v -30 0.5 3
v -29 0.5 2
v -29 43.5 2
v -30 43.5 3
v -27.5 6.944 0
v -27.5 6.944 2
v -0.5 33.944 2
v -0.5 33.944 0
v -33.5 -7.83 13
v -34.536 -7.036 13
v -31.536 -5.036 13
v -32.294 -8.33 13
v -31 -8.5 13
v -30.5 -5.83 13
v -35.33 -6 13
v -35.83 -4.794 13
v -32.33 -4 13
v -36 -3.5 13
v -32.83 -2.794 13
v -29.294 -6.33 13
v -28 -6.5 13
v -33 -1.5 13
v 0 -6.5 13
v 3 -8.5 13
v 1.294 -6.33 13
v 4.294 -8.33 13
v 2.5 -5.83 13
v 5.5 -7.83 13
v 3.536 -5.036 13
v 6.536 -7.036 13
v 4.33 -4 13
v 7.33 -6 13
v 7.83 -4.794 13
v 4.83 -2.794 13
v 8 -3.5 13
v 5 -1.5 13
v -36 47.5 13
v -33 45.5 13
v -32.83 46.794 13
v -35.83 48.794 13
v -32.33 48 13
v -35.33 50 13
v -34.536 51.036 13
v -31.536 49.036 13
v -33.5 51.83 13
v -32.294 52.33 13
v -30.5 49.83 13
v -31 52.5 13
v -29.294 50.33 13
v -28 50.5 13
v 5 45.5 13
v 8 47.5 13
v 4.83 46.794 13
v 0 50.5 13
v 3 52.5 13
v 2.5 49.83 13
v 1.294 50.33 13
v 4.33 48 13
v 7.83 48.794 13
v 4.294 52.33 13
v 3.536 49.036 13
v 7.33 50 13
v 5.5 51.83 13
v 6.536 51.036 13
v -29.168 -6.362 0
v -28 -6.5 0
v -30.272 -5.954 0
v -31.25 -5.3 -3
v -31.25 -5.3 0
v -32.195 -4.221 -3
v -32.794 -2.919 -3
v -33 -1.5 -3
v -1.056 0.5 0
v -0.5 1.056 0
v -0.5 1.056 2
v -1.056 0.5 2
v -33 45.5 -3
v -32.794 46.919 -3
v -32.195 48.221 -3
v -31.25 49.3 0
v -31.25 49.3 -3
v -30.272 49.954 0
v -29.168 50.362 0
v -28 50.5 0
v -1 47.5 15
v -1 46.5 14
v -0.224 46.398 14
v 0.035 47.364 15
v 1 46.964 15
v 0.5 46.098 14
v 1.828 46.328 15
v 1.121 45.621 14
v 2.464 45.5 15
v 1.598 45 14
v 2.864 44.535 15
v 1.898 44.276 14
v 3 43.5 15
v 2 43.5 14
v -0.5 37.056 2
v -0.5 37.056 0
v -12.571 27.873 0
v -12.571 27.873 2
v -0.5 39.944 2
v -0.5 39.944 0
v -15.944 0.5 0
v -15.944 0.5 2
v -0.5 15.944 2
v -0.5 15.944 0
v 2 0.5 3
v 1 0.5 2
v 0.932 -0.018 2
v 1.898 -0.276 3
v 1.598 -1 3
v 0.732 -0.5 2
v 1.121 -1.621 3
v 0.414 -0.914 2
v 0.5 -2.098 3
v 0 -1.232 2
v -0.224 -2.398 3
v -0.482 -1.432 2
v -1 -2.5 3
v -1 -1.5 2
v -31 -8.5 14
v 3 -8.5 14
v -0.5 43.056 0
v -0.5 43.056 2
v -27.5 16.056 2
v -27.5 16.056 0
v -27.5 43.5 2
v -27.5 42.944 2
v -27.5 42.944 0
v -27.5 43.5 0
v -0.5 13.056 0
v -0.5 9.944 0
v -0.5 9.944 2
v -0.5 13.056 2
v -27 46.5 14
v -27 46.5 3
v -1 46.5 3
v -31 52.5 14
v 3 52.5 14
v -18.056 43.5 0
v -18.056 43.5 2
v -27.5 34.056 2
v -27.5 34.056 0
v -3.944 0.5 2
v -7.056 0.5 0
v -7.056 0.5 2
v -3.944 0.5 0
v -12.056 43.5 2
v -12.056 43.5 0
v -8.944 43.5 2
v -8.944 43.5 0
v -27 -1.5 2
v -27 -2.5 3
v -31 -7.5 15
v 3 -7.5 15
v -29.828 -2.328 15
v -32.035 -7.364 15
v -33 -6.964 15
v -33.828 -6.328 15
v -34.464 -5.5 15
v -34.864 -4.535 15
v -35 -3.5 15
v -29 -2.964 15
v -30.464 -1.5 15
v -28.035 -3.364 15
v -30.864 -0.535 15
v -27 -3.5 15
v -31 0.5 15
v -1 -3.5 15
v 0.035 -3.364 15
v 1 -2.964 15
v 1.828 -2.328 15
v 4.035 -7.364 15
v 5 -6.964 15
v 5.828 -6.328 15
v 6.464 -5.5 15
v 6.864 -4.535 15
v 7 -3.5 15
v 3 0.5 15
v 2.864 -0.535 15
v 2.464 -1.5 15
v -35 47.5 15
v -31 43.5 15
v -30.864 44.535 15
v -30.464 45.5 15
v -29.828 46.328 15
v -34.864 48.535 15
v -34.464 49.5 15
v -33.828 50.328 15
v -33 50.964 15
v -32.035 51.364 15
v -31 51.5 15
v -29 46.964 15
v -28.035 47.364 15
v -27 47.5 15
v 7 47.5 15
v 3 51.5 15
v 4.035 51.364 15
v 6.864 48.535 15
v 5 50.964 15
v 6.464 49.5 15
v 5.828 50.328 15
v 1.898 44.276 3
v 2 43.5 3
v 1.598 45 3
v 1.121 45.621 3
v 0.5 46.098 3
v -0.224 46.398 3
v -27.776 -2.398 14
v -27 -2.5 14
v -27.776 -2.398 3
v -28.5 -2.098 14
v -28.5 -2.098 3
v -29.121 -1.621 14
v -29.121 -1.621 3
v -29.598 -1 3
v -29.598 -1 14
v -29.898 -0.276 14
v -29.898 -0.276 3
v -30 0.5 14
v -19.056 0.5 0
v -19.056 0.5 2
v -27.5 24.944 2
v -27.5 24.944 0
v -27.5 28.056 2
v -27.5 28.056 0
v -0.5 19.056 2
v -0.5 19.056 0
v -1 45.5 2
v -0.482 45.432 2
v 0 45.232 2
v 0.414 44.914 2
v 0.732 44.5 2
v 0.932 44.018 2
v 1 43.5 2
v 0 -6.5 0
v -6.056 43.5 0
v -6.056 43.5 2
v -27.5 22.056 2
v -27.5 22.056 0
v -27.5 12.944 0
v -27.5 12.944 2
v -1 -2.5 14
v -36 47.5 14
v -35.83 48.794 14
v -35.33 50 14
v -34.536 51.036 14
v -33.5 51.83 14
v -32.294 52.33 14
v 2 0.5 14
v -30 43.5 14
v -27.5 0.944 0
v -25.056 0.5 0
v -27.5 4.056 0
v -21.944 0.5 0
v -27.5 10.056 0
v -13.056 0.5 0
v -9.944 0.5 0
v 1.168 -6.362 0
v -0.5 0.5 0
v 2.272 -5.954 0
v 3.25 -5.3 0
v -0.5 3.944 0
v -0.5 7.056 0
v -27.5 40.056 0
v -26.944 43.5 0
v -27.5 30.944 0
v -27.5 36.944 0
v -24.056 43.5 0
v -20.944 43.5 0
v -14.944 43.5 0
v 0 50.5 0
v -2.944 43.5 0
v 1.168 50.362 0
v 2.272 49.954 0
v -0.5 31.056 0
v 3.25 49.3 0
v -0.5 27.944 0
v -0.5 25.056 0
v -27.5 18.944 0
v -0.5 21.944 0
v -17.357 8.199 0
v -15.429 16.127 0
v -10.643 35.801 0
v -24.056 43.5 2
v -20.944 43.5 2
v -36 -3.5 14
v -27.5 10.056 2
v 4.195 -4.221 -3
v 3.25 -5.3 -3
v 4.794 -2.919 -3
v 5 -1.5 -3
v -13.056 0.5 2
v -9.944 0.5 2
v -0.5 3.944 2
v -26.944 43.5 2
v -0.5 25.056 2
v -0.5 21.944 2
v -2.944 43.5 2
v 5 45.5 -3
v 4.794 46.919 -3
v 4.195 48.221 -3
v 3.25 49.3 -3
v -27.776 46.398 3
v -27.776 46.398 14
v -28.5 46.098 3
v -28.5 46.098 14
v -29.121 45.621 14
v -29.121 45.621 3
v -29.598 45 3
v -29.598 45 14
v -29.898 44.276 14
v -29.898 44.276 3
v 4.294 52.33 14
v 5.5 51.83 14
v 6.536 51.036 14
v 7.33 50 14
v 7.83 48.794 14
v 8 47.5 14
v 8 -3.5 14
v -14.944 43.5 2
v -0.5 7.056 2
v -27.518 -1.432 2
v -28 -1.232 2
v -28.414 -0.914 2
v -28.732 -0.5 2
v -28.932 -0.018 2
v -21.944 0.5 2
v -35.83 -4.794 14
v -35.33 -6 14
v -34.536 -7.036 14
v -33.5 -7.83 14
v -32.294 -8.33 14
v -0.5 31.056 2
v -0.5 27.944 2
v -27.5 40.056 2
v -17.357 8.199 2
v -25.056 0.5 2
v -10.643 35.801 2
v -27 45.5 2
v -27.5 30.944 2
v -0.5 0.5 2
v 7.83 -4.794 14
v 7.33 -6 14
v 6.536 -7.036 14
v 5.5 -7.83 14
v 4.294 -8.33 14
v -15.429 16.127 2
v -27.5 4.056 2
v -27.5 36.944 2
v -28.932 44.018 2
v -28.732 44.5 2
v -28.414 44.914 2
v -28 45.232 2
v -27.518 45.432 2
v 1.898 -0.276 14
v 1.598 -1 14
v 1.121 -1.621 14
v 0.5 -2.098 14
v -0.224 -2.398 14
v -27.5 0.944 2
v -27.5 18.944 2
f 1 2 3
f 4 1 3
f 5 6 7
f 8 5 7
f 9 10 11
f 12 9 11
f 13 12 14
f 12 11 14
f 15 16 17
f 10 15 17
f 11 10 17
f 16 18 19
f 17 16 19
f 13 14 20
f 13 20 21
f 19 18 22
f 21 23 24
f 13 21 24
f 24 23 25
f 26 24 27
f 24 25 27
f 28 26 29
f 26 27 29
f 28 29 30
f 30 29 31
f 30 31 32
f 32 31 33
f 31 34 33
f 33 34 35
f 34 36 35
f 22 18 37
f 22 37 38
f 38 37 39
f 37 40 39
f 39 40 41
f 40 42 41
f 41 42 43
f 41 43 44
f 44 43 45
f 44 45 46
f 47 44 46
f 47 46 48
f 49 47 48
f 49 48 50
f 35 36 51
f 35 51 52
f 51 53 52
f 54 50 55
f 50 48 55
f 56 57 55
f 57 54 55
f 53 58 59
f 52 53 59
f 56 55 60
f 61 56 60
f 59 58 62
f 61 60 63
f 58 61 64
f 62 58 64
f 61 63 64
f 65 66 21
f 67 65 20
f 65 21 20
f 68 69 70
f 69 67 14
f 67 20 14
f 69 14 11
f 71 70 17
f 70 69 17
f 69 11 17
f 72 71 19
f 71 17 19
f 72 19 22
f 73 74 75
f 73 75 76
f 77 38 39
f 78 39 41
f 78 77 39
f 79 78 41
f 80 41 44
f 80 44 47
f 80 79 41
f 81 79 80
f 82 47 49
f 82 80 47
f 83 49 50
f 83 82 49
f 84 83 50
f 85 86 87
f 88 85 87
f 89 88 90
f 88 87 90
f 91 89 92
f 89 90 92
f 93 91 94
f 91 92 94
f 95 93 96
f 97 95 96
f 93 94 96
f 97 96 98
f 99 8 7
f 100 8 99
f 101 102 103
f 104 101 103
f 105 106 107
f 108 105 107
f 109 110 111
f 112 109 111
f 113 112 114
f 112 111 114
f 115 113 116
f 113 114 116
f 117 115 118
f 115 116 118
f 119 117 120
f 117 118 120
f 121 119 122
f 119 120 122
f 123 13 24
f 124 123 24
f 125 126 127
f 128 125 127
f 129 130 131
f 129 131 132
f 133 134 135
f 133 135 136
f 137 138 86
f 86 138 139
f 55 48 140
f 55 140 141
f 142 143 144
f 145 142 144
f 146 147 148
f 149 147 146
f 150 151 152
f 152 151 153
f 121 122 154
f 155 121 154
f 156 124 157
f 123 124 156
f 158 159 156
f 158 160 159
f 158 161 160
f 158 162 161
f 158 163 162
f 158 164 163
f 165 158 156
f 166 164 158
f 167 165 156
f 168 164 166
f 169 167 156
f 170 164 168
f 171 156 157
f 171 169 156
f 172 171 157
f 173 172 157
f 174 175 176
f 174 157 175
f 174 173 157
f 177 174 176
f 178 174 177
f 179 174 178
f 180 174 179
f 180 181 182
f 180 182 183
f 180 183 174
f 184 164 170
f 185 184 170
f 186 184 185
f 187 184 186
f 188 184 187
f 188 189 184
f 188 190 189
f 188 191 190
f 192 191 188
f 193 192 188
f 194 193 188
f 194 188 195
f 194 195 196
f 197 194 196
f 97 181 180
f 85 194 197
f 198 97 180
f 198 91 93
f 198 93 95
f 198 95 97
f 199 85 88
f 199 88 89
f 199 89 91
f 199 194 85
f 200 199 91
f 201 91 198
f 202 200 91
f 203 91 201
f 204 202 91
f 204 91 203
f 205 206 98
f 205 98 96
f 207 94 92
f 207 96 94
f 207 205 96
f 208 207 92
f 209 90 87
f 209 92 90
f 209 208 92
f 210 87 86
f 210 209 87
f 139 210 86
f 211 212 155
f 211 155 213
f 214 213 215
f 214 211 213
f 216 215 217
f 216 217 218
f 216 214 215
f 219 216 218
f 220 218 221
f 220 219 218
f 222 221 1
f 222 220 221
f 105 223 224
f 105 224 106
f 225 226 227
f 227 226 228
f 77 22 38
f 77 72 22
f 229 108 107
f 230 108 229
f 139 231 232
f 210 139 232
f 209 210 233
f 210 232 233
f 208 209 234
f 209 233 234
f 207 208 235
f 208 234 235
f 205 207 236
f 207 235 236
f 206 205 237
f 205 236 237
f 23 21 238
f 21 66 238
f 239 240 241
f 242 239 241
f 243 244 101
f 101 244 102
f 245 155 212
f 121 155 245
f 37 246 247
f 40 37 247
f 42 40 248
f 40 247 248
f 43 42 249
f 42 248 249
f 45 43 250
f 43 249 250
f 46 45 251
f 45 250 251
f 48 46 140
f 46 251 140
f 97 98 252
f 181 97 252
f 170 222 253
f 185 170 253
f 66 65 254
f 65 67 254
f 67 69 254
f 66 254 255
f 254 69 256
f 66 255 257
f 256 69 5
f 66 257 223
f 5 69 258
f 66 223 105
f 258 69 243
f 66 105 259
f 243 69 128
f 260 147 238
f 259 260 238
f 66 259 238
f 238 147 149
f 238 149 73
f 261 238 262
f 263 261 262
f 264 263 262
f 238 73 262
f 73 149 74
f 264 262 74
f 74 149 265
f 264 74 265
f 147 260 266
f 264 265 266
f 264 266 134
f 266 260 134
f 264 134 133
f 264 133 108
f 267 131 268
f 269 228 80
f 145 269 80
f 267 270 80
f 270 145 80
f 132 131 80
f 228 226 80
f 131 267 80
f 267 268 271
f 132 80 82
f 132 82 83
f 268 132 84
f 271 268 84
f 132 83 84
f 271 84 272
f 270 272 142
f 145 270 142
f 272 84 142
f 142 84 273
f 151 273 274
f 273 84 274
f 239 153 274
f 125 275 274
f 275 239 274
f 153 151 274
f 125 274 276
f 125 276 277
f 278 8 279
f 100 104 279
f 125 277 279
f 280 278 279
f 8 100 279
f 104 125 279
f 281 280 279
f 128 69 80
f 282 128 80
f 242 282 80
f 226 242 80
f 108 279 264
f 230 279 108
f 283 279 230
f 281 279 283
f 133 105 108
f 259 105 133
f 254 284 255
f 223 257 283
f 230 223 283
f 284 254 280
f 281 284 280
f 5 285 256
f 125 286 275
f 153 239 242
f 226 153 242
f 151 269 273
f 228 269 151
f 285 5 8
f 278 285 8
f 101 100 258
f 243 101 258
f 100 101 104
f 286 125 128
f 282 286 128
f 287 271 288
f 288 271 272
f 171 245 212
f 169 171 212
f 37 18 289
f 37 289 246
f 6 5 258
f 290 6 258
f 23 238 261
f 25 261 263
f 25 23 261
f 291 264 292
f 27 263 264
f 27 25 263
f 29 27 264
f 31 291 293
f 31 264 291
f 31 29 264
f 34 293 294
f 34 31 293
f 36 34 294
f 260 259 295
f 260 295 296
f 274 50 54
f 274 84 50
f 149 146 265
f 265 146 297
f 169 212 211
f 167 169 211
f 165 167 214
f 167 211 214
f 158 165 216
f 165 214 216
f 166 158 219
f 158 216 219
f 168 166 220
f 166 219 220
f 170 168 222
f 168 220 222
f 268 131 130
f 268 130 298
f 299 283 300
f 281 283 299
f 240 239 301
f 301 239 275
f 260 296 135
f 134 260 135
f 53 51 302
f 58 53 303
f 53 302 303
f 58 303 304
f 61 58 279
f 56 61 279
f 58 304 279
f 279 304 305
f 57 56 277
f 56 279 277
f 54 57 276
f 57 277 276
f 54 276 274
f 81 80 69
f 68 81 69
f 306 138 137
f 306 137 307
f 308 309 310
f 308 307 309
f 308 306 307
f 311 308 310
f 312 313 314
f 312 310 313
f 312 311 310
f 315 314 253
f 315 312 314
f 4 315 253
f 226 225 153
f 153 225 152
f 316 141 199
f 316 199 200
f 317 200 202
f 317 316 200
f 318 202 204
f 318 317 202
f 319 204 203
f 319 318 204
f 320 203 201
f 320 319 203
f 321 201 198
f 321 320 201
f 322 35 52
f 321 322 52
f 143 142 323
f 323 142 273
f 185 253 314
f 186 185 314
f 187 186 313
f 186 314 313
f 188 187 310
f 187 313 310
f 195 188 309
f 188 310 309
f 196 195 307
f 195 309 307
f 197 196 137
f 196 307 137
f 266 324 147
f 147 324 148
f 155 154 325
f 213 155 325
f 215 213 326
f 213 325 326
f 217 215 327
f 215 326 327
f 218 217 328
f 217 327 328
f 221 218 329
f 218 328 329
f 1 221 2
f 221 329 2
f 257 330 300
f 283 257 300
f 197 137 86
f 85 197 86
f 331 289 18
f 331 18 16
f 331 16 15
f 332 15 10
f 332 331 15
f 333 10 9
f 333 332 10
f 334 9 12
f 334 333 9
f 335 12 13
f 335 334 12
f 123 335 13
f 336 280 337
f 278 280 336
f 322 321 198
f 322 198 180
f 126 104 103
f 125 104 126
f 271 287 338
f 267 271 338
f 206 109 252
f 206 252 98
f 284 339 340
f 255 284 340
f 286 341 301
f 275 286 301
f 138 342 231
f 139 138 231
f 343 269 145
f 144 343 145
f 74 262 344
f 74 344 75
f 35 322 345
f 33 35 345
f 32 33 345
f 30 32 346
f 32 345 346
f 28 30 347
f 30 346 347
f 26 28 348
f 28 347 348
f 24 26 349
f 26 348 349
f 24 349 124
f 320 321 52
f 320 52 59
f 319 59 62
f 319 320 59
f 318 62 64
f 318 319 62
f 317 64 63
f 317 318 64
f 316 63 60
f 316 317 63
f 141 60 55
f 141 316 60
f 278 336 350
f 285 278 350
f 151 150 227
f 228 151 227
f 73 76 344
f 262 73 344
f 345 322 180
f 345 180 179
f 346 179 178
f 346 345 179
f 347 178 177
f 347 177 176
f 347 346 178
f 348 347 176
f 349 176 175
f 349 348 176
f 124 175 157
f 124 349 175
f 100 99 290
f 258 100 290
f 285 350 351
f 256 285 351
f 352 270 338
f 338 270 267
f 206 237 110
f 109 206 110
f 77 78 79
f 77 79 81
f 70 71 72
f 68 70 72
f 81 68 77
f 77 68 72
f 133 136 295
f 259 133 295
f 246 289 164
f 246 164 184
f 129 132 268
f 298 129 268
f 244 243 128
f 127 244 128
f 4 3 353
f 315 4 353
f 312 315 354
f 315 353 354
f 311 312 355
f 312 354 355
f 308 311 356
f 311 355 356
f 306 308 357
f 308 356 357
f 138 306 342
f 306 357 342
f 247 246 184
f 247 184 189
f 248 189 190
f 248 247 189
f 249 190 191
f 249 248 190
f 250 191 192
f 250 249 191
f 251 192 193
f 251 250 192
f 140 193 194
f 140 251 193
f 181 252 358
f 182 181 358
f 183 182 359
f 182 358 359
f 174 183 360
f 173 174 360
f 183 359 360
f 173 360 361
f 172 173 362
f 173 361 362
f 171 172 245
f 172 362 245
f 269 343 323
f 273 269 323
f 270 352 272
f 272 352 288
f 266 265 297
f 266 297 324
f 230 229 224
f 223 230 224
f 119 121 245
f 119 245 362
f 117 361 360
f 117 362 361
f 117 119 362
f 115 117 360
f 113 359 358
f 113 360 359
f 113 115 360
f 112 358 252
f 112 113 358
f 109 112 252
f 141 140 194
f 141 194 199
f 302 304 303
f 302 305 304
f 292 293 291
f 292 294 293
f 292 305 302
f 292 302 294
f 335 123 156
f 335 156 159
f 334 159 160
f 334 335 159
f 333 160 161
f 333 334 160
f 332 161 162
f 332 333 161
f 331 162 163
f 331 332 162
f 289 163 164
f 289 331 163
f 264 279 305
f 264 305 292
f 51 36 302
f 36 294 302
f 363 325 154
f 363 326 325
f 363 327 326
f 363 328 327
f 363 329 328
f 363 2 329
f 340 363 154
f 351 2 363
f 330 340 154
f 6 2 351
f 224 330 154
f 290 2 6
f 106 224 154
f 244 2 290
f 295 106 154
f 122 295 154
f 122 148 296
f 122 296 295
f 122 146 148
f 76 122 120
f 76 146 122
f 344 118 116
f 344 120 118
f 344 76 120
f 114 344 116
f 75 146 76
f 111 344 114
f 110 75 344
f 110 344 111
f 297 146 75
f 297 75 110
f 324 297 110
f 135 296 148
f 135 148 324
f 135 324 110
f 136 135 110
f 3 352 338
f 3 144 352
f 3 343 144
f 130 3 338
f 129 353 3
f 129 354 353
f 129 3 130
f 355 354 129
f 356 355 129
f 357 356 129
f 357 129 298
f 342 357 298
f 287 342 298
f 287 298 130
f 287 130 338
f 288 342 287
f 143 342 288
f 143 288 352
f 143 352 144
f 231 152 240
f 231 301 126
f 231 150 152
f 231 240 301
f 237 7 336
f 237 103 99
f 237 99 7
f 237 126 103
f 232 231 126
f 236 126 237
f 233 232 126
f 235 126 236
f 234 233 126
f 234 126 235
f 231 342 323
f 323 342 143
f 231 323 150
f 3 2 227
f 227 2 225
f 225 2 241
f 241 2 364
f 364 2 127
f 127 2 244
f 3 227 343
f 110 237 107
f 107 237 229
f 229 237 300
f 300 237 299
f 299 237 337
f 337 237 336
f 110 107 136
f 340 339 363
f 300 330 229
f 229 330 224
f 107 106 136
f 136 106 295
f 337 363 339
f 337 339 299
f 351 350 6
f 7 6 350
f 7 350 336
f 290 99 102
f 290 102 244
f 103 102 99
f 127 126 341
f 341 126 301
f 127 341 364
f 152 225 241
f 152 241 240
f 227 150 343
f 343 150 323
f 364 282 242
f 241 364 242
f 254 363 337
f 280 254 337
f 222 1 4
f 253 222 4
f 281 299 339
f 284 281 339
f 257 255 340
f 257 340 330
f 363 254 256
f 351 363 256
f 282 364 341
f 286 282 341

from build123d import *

# Parameters (mm, degrees)
F0_W      = 28
F0_H      = 44
F1_DEPTH  = 2
F3_DEPTH  = 2
F4_W      = 38
F4_H      = 57
F4_W_2    = 27
F4_H_2    = 43
F5_DEPTH  = 2
F6_W      = 1.75
F6_H      = 57
F7_DEPTH  = 3
F8_W      = 38
F8_H      = 57
F8_W_2    = 32
F8_H_2    = 49
F9_DEPTH  = 11
F10_W     = 44
F10_H     = 61
F10_W_2   = 32
F10_H_2   = 49
F11_DEPTH = 2
F12_R     = 5
F13_R     = 3
F14_SIZE  = 1


with BuildPart() as f1:
    # F0 (on Top) → F1 (new body)
    with BuildSketch(Plane.XY):
        with Locations((-14, 22)):
            Rectangle(F0_W, F0_H)
    extrude(amount=F1_DEPTH)

    # F2 (on face) → F3 (cut, through all)
    with BuildSketch(Plane.XY.offset(2)):
        Polygon((-28, 48.4443650814), (-1.0000491969, 75.4443158845), (0, 79.5556349186), (-29.5556349186, 50), align=None)
        Polygon((0, 79.5556349186), (-1.0000491969, 75.4443158845), (1.5556349186, 78), align=None)
        Polygon((-28, 42.4443650814), (-2.9286171114, 67.51574797), (-1.9285679145, 71.6270670041), (-29.5556349186, 44), align=None)
        Polygon((-1.9285679145, 71.6270670041), (-2.9286171114, 67.51574797), (1.5556349186, 72), (0, 73.5556349186), align=None)
        Polygon((-28, 36.4443650814), (-4.8571850259, 59.5871800555), (-3.857135829, 63.6984990896), (-29.5556349186, 38), align=None)
        Polygon((-3.857135829, 63.6984990896), (-4.8571850259, 59.5871800555), (1.5556349186, 66), (0, 67.5556349186), align=None)
        Polygon((-28, 30.4443650814), (-6.7857529404, 51.658612141), (-5.7857037435, 55.7699311751), (-29.5556349186, 32), align=None)
        Polygon((-5.7857037435, 55.7699311751), (-6.7857529404, 51.658612141), (1.5556349186, 60), (0, 61.5556349186), align=None)
        Polygon((-28, 24.4443650814), (-8.7143208549, 43.7300442265), (-7.714271658, 47.8413632606), (-29.5556349186, 26), align=None)
        Polygon((-7.714271658, 47.8413632606), (-8.7143208549, 43.7300442265), (1.5556349186, 54), (0, 55.5556349186), align=None)
        Polygon((-28, 18.4443650814), (-10.6428887694, 35.8014763119), (-9.6428395725, 39.9127953461), (-29.5556349186, 20), align=None)
        Polygon((-9.6428395725, 39.9127953461), (-10.6428887694, 35.8014763119), (1.5556349186, 48), (0, 49.5556349186), align=None)
        Polygon((-28, 12.4443650814), (-12.5714566839, 27.8729083974), (-11.571407487, 31.9842274316), (-29.5556349186, 14), align=None)
        Polygon((-11.571407487, 31.9842274316), (-12.5714566839, 27.8729083974), (1.5556349186, 42), (0, 43.5556349186), align=None)
        Polygon((-28, 6.4443650814), (-14.5000245985, 19.9443404829), (-13.4999754015, 24.0556595171), (-29.5556349186, 8), align=None)
        Polygon((-13.4999754015, 24.0556595171), (-14.5000245985, 19.9443404829), (1.5556349186, 36), (0, 37.5556349186), align=None)
        Polygon((-28, 0.4443650814), (-16.428592513, 12.0157725684), (-15.4285433161, 16.1270916026), (-29.5556349186, 2), align=None)
        Polygon((-15.4285433161, 16.1270916026), (-16.428592513, 12.0157725684), (1.5556349186, 30), (0, 31.5556349186), align=None)
        Polygon((-28, -5.5556349186), (-18.3571604275, 4.0872046539), (-17.3571112306, 8.1985236881), (-29.5556349186, -4), align=None)
        Polygon((-17.3571112306, 8.1985236881), (-18.3571604275, 4.0872046539), (1.5556349186, 24), (0, 25.5556349186), align=None)
        Polygon((-28, -11.5556349186), (-20.285728342, -3.8413632606), (-19.2856791451, 0.2699557735), (-29.5556349186, -10), align=None)
        Polygon((-19.2856791451, 0.2699557735), (-20.285728342, -3.8413632606), (1.5556349186, 18), (0, 19.5556349186), align=None)
        Polygon((-28, -17.5556349186), (-22.2142962565, -11.7699311751), (-21.2142470596, -7.658612141), (-29.5556349186, -16), align=None)
        Polygon((-21.2142470596, -7.658612141), (-22.2142962565, -11.7699311751), (1.5556349186, 12), (0, 13.5556349186), align=None)
        Polygon((-28, -23.5556349186), (-24.142864171, -19.6984990896), (-23.1428149741, -15.5871800555), (-29.5556349186, -22), align=None)
        Polygon((-23.1428149741, -15.5871800555), (-24.142864171, -19.6984990896), (1.5556349186, 6), (0, 7.5556349186), align=None)
        Polygon((-28, -29.5556349186), (-26.0714320855, -27.6270670041), (-25.0713828886, -23.51574797), (-29.5556349186, -28), align=None)
        Polygon((-25.0713828886, -23.51574797), (-26.0714320855, -27.6270670041), (1.5556349186, 0), (0, 1.5556349186), align=None)
        Polygon((-26.9999508031, -31.4443158845), (-29.5556349186, -34), (-28, -35.5556349186), align=None)
        Polygon((0, -4.4443650814), (-26.9999508031, -31.4443158845), (-28, -35.5556349186), (1.5556349186, -6), align=None)
    extrude(amount=-F3_DEPTH, mode=Mode.SUBTRACT)

    # F4 (on Top) → F5 (join)
    with BuildSketch(Plane.XY):
        with Locations((-14, 22)):
            Rectangle(F4_W, F4_H)
        with Locations((-14, 22)):
            Rectangle(F4_W_2, F4_H_2, mode=Mode.SUBTRACT)
    extrude(amount=F5_DEPTH)

    # F6 (on face) → F7 (join)
    with BuildSketch(Plane(origin=(0, 0, 0), x_dir=(1, 0, 0), z_dir=(0, 0, -1))):
        with Locations((-32.125, -22)):
            Rectangle(F6_W, F6_H)
        with Locations((4.125, -22)):
            Rectangle(F6_W, F6_H)
    extrude(amount=F7_DEPTH)

    # F8 (on face) → F9 (join)
    with BuildSketch(Plane.XY.offset(2)):
        with Locations((-14, 22)):
            Rectangle(F8_W, F8_H)
        with Locations((-14, 22)):
            Rectangle(F8_W_2, F8_H_2, mode=Mode.SUBTRACT)
    extrude(amount=F9_DEPTH)

    # F10 (on face) → F11 (join)
    with BuildSketch(Plane.XY.offset(13)):
        with Locations((-14, 22)):
            Rectangle(F10_W, F10_H)
        with Locations((-14, 22)):
            Rectangle(F10_W_2, F10_H_2, mode=Mode.SUBTRACT)
    extrude(amount=F11_DEPTH)

    # F12
    f12_edges = [f1.edges().sort_by_distance(p)[0] for p in [
        (8, -8.5, 14),
        (5, -6.5, 5),
        (-33, -6.5, 5),
        (-36, -8.5, 14),
        (-36, 52.5, 14),
        (-33, 50.5, 5),
        (8, 52.5, 14),
        (5, 50.5, 5),
    ]]
    fillet(f12_edges, radius=F12_R)

    # F13
    f13_edges = [f1.edges().sort_by_distance(p)[0] for p in [
        (-30, 46.5, 8.5),
        (-30, -2.5, 8.5),
        (2, 46.5, 8.5),
        (2, -2.5, 8.5),
    ]]
    fillet(f13_edges, radius=F13_R)

    # F14
    f14_edges = [f1.edges().sort_by_distance(p)[0] for p in [
        (-14, 46.5, 2),
        (-14, 46.5, 15),
        (-36, 22, 15),
    ]]
    chamfer(f14_edges, length=F14_SIZE)


solid = f1.part
